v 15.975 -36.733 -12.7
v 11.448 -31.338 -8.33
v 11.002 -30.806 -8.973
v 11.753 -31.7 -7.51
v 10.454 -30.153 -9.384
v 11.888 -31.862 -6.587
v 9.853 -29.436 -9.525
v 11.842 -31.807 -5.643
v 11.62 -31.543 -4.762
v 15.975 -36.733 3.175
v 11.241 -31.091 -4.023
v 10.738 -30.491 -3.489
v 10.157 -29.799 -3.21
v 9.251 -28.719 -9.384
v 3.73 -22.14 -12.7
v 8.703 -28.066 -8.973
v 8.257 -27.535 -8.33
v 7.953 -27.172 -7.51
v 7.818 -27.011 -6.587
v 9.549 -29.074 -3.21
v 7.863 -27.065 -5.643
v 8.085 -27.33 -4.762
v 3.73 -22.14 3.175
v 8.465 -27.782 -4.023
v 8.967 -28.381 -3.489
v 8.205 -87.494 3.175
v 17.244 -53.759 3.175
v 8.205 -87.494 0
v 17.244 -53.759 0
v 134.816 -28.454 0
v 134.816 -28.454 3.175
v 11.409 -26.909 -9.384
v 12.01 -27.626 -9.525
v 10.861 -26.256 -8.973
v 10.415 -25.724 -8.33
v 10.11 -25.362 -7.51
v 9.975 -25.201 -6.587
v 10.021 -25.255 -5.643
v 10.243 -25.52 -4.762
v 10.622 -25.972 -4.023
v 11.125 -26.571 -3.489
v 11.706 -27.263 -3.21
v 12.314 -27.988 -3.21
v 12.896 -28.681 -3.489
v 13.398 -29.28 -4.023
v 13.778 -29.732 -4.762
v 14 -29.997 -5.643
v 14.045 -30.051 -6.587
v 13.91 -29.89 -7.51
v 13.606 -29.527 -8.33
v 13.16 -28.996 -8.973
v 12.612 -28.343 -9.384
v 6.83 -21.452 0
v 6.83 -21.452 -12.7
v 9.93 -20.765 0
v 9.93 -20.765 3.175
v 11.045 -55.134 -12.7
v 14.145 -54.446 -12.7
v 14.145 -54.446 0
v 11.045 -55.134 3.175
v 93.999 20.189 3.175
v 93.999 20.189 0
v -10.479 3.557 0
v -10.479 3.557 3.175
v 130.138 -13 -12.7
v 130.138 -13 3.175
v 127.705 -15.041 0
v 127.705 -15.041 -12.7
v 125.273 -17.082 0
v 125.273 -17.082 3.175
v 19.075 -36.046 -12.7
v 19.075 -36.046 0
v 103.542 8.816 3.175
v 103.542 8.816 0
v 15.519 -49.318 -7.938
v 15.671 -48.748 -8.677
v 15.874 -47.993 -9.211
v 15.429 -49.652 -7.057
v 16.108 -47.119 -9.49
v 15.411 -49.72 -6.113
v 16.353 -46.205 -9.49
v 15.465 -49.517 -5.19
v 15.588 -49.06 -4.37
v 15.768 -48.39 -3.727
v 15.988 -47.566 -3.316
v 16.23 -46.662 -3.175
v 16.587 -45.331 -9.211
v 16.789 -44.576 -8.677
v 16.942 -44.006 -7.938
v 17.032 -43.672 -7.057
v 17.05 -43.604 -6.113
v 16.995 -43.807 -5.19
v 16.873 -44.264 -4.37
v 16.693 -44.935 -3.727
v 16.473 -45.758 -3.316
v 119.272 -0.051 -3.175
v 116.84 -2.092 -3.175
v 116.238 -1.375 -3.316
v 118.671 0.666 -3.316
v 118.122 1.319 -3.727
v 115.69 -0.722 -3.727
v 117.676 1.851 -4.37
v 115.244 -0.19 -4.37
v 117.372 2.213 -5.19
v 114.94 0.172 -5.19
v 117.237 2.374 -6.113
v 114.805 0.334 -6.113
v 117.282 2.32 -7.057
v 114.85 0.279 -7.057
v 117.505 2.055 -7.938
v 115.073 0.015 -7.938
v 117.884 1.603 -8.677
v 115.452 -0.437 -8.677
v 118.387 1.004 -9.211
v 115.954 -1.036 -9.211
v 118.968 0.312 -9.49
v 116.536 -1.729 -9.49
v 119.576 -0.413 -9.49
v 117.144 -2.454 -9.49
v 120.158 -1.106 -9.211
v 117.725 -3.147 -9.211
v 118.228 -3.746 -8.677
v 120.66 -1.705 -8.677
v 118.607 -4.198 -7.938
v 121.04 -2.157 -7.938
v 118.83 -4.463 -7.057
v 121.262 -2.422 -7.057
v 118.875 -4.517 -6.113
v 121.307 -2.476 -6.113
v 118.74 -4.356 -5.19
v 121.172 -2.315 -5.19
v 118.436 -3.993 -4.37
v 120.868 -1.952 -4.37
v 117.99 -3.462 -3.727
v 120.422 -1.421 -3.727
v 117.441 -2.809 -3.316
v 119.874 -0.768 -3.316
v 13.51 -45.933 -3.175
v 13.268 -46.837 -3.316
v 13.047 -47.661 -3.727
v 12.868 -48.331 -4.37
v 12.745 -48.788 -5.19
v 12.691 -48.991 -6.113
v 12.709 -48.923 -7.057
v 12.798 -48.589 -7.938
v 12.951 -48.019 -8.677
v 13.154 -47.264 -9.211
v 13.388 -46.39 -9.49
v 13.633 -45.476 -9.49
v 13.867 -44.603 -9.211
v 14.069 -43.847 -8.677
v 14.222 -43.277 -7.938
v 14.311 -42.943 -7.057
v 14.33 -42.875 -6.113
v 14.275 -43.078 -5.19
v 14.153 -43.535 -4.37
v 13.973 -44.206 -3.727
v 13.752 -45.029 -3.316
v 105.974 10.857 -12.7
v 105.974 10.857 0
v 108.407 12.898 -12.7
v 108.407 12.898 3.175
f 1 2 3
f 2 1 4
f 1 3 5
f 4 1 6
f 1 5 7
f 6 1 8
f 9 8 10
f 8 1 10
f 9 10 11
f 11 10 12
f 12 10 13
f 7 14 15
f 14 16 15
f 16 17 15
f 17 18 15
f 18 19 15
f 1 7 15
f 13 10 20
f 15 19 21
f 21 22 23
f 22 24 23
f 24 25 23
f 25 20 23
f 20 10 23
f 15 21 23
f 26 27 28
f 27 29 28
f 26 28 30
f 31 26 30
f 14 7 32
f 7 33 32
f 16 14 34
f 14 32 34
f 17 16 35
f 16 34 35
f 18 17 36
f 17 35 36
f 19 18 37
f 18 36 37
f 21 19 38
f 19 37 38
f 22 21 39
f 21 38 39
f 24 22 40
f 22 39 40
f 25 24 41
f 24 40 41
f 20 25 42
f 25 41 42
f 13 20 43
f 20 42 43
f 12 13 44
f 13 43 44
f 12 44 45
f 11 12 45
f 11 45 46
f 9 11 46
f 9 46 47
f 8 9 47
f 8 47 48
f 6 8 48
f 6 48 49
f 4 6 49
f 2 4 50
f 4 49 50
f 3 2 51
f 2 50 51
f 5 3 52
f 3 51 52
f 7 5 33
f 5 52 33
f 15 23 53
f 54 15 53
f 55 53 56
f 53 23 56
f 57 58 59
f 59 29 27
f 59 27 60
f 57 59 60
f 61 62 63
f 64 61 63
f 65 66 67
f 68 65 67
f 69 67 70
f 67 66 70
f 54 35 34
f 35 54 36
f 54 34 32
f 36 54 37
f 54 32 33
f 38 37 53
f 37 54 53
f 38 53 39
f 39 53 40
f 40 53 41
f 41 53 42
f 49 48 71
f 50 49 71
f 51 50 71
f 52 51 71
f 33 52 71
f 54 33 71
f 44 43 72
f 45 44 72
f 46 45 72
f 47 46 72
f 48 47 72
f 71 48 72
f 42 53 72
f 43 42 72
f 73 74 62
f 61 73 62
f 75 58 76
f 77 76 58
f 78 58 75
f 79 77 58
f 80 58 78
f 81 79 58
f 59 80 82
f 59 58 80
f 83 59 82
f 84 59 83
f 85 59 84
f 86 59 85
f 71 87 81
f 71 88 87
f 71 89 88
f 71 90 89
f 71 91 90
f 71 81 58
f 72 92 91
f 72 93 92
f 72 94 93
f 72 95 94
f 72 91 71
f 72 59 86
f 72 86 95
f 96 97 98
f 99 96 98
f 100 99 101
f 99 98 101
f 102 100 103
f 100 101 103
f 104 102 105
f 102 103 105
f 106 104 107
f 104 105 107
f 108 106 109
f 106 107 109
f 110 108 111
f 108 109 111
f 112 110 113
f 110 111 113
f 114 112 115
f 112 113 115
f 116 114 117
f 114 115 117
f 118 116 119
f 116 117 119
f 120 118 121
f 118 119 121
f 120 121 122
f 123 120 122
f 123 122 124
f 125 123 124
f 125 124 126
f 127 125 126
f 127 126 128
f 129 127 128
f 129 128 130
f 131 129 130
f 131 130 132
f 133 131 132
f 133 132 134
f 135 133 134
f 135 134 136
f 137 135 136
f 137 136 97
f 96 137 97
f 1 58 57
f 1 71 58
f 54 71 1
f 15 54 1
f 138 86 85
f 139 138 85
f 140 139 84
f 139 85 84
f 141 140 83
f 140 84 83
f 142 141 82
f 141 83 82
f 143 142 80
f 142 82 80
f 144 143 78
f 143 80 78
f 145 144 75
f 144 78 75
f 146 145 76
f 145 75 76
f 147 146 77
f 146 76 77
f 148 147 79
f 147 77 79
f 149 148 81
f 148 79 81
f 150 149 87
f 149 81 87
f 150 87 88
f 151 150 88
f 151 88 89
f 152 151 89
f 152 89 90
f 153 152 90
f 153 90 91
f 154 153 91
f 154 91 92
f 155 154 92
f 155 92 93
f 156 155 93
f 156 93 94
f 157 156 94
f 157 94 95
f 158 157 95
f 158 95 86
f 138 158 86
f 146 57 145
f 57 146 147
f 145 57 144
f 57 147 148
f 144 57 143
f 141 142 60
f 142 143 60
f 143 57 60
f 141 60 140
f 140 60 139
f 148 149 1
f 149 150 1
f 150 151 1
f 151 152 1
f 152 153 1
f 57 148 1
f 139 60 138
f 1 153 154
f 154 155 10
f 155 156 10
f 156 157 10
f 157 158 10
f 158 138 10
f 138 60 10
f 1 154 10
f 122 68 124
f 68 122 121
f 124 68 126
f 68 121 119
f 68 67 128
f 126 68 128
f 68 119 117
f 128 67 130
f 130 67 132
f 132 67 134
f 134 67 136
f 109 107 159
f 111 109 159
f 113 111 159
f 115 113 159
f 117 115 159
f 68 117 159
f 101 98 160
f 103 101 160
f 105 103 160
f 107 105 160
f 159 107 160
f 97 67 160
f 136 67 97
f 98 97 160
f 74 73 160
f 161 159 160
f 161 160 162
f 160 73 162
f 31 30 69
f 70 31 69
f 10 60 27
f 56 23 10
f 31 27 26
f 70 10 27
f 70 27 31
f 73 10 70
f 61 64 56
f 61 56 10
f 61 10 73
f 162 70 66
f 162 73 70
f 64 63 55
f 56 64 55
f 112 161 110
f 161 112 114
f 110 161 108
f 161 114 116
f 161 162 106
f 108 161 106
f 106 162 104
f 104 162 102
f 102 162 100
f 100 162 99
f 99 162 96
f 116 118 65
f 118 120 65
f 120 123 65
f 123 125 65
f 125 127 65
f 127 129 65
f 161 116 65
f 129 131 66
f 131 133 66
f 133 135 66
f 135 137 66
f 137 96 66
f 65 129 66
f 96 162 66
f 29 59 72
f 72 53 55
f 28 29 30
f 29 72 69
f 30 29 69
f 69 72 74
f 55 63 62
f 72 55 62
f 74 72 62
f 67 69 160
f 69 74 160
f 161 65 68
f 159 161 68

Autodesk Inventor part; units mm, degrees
ref_plane "YZ Plane" through (0, 0, 0) normal (1, 0, 0) x (0, 1, 0)
ref_plane "XZ Plane" through (0, 0, 0) normal (0, 1, 0) x (-1, 0, 0)
ref_plane "XY Plane" through (0, 0, 0) normal (0, 0, 1) x (1, 0, 0)
sketch "Sketch1" plane through (0, 0, 0) normal (0, 0, 1) x (1, 0, 0)
  line L0 (-10.4788, 3.5567) -> (22.1748, -35.3584)
  line L1 (-10.4788, 3.5567) -> (40.3212, 3.5567) construction
  line L2 (22.1748, -35.3584) -> (8.205, -87.4942)
  line L3 (8.205, -87.4942) -> (134.8162, -28.4545)
  line L4 (134.8162, -28.4545) -> (93.9992, 20.1894)
  line L5 (93.9992, 20.1894) -> (-10.4788, 3.5567)
  point P0 (0, 0)
  dimension "d0" = 50.8
  dimension "d1" = 50
  dimension "d2" = 53.975
  dimension "d3" = 125
  dimension "d4" = 139.7
  dimension "d5" = 50
  dimension "d6" = 63.5
  dimension "d7" = 75
extrude "Extrusion1" add sketch "Sketch1" along normal blind 3.175
sketch "Sketch2" plane through (0, 0, 3.175) normal (0, 0, 1) x (1, 0, 0)
  line L0 (-10.4788, 3.5567) -> (22.1748, -35.3584) projected
  line L1 (22.1748, -35.3584) -> (8.205, -87.4942) projected
  line L2 (22.1748, -35.3584) -> (9.9297, -20.7652)
  line L3 (22.1748, -35.3584) -> (17.2443, -53.7593)
  line L4 (9.9297, -20.7652) -> (3.7302, -22.1396)
  line L5 (17.2443, -53.7593) -> (11.0448, -55.1337)
  line L6 (15.9753, -36.7328) -> (3.7302, -22.1396)
  line L7 (15.9753, -36.7328) -> (11.0448, -55.1337)
  point P0 (0, 0)
  dimension "d10" = 19.05
  dimension "d11" = 19.05
  dimension "d12" = 6.35
  dimension "d13" = 6.35
  dimension "d14" = 6.35
extrude "Extrusion2" add sketch "Sketch2" against normal blind 3.175
sketch "Sketch3" plane through (0, 0, 0) normal (0, 0, -1) x (-1, 0, 0)
  line L0 (-17.2443, -53.7593) -> (-11.0448, -55.1337) projected
  line L1 (-11.0448, -55.1337) -> (-15.9753, -36.7328) projected
  line L2 (-15.9753, -36.7328) -> (-3.7302, -22.1396) projected
  line L3 (-3.7302, -22.1396) -> (-9.9297, -20.7652) projected
  line L4 (-3.7302, -22.1396) -> (-6.83, -21.4524)
  line L5 (-11.0448, -55.1337) -> (-14.1446, -54.4465)
  line L6 (-14.1446, -54.4465) -> (-19.0751, -36.0456)
  line L7 (-6.83, -21.4524) -> (-19.0751, -36.0456)
  point P0 (0, 0)
  dimension "d17" = 3.175
  dimension "d18" = 3.175
extrude "Extrusion3" add sketch "Sketch3" along normal blind 12.7
sketch "Sketch4" plane through (3.7302, -22.1396, -12.7) normal (-0.7660444, -0.6427876, 0) x (0, 0, 1)
  line L0 (0, -19.05) -> (0, 0) projected
  line L1 (15.875, -19.05) -> (0, -19.05) projected
  line L2 (0, -9.525) -> (6.35, -9.525)
  point P0 (12.7, 19.3577)
  dimension "d21" = 6.35
hole "Hole1" at (9.8528, -29.4362, -6.35) direction (0.7660444, 0.6427876, 0) diameter 6.35 end through all
sketch "Sketch5" plane through (15.9753, -36.7328, -12.7) normal (-0.9659258, 0.258819, 0) x (0, 0, 1)
  line L0 (0, -19.05) -> (0, 0) projected
  line L1 (15.875, -19.05) -> (0, -19.05) projected
  line L2 (0, -9.525) -> (6.35, -9.525)
  point P0 (12.7, 31.3464)
  dimension "d29" = 6.35
hole "Hole2" at (13.5101, -45.9332, -6.35) direction (0.9659258, -0.258819, 0) diameter 6.35 end through all
sketch "Sketch6" plane through (0, 0, 0) normal (0, 0, -1) x (-1, 0, 0)
  line L0 (-134.8162, -28.4545) -> (-93.9992, 20.1894) projected
  line L1 (-114.4077, -4.1326) -> (-103.5422, 8.8164)
  line L2 (-114.4077, -4.1326) -> (-125.2732, -17.0815)
  line L3 (-125.2732, -17.0815) -> (-130.1376, -12.9998)
  line L4 (-130.1376, -12.9998) -> (-108.4066, 12.8981)
  line L5 (-108.4066, 12.8981) -> (-103.5422, 8.8164)
  point P0 (0, 0)
  dimension "d37" = 16.9037
  dimension "d38" = 16.9037
  dimension "d39" = 6.35
  dimension "d40" = 33.8074
extrude "Extrusion4" add sketch "Sketch6" against normal blind 3.175
sketch "Sketch7" plane through (0, 0, 0) normal (0, 0, -1) x (-1, 0, 0)
  line L0 (-103.5422, 8.8164) -> (-108.4066, 12.8981) projected
  line L1 (-108.4066, 12.8981) -> (-130.1376, -12.9998) projected
  line L2 (-130.1376, -12.9998) -> (-125.2732, -17.0815) projected
  line L3 (-108.4066, 12.8981) -> (-130.1376, -12.9998)
  line L4 (-130.1376, -12.9998) -> (-127.7054, -15.0407)
  line L5 (-127.7054, -15.0407) -> (-105.9744, 10.8573)
  line L6 (-105.9744, 10.8573) -> (-108.4066, 12.8981)
  point P0 (0, 0)
  dimension "d43" = 3.175
extrude "Extrusion5" add sketch "Sketch7" along normal blind 12.7
sketch "Sketch8" plane through (108.4066, 12.8981, 3.175) normal (0.7660444, 0.6427876, 0) x (0, 0, -1)
  line L0 (15.875, 0) -> (15.875, -33.8074) projected
  line L1 (15.875, -16.9037) -> (9.525, -16.9037)
  point P0 (3.175, 59.8019)
  dimension "d46" = 6.35
hole "Hole3" at (119.2721, -0.0509, -6.35) direction (-0.7660444, -0.6427876, 0) diameter 6.35 end through all
properties part number "Right Bicep"
